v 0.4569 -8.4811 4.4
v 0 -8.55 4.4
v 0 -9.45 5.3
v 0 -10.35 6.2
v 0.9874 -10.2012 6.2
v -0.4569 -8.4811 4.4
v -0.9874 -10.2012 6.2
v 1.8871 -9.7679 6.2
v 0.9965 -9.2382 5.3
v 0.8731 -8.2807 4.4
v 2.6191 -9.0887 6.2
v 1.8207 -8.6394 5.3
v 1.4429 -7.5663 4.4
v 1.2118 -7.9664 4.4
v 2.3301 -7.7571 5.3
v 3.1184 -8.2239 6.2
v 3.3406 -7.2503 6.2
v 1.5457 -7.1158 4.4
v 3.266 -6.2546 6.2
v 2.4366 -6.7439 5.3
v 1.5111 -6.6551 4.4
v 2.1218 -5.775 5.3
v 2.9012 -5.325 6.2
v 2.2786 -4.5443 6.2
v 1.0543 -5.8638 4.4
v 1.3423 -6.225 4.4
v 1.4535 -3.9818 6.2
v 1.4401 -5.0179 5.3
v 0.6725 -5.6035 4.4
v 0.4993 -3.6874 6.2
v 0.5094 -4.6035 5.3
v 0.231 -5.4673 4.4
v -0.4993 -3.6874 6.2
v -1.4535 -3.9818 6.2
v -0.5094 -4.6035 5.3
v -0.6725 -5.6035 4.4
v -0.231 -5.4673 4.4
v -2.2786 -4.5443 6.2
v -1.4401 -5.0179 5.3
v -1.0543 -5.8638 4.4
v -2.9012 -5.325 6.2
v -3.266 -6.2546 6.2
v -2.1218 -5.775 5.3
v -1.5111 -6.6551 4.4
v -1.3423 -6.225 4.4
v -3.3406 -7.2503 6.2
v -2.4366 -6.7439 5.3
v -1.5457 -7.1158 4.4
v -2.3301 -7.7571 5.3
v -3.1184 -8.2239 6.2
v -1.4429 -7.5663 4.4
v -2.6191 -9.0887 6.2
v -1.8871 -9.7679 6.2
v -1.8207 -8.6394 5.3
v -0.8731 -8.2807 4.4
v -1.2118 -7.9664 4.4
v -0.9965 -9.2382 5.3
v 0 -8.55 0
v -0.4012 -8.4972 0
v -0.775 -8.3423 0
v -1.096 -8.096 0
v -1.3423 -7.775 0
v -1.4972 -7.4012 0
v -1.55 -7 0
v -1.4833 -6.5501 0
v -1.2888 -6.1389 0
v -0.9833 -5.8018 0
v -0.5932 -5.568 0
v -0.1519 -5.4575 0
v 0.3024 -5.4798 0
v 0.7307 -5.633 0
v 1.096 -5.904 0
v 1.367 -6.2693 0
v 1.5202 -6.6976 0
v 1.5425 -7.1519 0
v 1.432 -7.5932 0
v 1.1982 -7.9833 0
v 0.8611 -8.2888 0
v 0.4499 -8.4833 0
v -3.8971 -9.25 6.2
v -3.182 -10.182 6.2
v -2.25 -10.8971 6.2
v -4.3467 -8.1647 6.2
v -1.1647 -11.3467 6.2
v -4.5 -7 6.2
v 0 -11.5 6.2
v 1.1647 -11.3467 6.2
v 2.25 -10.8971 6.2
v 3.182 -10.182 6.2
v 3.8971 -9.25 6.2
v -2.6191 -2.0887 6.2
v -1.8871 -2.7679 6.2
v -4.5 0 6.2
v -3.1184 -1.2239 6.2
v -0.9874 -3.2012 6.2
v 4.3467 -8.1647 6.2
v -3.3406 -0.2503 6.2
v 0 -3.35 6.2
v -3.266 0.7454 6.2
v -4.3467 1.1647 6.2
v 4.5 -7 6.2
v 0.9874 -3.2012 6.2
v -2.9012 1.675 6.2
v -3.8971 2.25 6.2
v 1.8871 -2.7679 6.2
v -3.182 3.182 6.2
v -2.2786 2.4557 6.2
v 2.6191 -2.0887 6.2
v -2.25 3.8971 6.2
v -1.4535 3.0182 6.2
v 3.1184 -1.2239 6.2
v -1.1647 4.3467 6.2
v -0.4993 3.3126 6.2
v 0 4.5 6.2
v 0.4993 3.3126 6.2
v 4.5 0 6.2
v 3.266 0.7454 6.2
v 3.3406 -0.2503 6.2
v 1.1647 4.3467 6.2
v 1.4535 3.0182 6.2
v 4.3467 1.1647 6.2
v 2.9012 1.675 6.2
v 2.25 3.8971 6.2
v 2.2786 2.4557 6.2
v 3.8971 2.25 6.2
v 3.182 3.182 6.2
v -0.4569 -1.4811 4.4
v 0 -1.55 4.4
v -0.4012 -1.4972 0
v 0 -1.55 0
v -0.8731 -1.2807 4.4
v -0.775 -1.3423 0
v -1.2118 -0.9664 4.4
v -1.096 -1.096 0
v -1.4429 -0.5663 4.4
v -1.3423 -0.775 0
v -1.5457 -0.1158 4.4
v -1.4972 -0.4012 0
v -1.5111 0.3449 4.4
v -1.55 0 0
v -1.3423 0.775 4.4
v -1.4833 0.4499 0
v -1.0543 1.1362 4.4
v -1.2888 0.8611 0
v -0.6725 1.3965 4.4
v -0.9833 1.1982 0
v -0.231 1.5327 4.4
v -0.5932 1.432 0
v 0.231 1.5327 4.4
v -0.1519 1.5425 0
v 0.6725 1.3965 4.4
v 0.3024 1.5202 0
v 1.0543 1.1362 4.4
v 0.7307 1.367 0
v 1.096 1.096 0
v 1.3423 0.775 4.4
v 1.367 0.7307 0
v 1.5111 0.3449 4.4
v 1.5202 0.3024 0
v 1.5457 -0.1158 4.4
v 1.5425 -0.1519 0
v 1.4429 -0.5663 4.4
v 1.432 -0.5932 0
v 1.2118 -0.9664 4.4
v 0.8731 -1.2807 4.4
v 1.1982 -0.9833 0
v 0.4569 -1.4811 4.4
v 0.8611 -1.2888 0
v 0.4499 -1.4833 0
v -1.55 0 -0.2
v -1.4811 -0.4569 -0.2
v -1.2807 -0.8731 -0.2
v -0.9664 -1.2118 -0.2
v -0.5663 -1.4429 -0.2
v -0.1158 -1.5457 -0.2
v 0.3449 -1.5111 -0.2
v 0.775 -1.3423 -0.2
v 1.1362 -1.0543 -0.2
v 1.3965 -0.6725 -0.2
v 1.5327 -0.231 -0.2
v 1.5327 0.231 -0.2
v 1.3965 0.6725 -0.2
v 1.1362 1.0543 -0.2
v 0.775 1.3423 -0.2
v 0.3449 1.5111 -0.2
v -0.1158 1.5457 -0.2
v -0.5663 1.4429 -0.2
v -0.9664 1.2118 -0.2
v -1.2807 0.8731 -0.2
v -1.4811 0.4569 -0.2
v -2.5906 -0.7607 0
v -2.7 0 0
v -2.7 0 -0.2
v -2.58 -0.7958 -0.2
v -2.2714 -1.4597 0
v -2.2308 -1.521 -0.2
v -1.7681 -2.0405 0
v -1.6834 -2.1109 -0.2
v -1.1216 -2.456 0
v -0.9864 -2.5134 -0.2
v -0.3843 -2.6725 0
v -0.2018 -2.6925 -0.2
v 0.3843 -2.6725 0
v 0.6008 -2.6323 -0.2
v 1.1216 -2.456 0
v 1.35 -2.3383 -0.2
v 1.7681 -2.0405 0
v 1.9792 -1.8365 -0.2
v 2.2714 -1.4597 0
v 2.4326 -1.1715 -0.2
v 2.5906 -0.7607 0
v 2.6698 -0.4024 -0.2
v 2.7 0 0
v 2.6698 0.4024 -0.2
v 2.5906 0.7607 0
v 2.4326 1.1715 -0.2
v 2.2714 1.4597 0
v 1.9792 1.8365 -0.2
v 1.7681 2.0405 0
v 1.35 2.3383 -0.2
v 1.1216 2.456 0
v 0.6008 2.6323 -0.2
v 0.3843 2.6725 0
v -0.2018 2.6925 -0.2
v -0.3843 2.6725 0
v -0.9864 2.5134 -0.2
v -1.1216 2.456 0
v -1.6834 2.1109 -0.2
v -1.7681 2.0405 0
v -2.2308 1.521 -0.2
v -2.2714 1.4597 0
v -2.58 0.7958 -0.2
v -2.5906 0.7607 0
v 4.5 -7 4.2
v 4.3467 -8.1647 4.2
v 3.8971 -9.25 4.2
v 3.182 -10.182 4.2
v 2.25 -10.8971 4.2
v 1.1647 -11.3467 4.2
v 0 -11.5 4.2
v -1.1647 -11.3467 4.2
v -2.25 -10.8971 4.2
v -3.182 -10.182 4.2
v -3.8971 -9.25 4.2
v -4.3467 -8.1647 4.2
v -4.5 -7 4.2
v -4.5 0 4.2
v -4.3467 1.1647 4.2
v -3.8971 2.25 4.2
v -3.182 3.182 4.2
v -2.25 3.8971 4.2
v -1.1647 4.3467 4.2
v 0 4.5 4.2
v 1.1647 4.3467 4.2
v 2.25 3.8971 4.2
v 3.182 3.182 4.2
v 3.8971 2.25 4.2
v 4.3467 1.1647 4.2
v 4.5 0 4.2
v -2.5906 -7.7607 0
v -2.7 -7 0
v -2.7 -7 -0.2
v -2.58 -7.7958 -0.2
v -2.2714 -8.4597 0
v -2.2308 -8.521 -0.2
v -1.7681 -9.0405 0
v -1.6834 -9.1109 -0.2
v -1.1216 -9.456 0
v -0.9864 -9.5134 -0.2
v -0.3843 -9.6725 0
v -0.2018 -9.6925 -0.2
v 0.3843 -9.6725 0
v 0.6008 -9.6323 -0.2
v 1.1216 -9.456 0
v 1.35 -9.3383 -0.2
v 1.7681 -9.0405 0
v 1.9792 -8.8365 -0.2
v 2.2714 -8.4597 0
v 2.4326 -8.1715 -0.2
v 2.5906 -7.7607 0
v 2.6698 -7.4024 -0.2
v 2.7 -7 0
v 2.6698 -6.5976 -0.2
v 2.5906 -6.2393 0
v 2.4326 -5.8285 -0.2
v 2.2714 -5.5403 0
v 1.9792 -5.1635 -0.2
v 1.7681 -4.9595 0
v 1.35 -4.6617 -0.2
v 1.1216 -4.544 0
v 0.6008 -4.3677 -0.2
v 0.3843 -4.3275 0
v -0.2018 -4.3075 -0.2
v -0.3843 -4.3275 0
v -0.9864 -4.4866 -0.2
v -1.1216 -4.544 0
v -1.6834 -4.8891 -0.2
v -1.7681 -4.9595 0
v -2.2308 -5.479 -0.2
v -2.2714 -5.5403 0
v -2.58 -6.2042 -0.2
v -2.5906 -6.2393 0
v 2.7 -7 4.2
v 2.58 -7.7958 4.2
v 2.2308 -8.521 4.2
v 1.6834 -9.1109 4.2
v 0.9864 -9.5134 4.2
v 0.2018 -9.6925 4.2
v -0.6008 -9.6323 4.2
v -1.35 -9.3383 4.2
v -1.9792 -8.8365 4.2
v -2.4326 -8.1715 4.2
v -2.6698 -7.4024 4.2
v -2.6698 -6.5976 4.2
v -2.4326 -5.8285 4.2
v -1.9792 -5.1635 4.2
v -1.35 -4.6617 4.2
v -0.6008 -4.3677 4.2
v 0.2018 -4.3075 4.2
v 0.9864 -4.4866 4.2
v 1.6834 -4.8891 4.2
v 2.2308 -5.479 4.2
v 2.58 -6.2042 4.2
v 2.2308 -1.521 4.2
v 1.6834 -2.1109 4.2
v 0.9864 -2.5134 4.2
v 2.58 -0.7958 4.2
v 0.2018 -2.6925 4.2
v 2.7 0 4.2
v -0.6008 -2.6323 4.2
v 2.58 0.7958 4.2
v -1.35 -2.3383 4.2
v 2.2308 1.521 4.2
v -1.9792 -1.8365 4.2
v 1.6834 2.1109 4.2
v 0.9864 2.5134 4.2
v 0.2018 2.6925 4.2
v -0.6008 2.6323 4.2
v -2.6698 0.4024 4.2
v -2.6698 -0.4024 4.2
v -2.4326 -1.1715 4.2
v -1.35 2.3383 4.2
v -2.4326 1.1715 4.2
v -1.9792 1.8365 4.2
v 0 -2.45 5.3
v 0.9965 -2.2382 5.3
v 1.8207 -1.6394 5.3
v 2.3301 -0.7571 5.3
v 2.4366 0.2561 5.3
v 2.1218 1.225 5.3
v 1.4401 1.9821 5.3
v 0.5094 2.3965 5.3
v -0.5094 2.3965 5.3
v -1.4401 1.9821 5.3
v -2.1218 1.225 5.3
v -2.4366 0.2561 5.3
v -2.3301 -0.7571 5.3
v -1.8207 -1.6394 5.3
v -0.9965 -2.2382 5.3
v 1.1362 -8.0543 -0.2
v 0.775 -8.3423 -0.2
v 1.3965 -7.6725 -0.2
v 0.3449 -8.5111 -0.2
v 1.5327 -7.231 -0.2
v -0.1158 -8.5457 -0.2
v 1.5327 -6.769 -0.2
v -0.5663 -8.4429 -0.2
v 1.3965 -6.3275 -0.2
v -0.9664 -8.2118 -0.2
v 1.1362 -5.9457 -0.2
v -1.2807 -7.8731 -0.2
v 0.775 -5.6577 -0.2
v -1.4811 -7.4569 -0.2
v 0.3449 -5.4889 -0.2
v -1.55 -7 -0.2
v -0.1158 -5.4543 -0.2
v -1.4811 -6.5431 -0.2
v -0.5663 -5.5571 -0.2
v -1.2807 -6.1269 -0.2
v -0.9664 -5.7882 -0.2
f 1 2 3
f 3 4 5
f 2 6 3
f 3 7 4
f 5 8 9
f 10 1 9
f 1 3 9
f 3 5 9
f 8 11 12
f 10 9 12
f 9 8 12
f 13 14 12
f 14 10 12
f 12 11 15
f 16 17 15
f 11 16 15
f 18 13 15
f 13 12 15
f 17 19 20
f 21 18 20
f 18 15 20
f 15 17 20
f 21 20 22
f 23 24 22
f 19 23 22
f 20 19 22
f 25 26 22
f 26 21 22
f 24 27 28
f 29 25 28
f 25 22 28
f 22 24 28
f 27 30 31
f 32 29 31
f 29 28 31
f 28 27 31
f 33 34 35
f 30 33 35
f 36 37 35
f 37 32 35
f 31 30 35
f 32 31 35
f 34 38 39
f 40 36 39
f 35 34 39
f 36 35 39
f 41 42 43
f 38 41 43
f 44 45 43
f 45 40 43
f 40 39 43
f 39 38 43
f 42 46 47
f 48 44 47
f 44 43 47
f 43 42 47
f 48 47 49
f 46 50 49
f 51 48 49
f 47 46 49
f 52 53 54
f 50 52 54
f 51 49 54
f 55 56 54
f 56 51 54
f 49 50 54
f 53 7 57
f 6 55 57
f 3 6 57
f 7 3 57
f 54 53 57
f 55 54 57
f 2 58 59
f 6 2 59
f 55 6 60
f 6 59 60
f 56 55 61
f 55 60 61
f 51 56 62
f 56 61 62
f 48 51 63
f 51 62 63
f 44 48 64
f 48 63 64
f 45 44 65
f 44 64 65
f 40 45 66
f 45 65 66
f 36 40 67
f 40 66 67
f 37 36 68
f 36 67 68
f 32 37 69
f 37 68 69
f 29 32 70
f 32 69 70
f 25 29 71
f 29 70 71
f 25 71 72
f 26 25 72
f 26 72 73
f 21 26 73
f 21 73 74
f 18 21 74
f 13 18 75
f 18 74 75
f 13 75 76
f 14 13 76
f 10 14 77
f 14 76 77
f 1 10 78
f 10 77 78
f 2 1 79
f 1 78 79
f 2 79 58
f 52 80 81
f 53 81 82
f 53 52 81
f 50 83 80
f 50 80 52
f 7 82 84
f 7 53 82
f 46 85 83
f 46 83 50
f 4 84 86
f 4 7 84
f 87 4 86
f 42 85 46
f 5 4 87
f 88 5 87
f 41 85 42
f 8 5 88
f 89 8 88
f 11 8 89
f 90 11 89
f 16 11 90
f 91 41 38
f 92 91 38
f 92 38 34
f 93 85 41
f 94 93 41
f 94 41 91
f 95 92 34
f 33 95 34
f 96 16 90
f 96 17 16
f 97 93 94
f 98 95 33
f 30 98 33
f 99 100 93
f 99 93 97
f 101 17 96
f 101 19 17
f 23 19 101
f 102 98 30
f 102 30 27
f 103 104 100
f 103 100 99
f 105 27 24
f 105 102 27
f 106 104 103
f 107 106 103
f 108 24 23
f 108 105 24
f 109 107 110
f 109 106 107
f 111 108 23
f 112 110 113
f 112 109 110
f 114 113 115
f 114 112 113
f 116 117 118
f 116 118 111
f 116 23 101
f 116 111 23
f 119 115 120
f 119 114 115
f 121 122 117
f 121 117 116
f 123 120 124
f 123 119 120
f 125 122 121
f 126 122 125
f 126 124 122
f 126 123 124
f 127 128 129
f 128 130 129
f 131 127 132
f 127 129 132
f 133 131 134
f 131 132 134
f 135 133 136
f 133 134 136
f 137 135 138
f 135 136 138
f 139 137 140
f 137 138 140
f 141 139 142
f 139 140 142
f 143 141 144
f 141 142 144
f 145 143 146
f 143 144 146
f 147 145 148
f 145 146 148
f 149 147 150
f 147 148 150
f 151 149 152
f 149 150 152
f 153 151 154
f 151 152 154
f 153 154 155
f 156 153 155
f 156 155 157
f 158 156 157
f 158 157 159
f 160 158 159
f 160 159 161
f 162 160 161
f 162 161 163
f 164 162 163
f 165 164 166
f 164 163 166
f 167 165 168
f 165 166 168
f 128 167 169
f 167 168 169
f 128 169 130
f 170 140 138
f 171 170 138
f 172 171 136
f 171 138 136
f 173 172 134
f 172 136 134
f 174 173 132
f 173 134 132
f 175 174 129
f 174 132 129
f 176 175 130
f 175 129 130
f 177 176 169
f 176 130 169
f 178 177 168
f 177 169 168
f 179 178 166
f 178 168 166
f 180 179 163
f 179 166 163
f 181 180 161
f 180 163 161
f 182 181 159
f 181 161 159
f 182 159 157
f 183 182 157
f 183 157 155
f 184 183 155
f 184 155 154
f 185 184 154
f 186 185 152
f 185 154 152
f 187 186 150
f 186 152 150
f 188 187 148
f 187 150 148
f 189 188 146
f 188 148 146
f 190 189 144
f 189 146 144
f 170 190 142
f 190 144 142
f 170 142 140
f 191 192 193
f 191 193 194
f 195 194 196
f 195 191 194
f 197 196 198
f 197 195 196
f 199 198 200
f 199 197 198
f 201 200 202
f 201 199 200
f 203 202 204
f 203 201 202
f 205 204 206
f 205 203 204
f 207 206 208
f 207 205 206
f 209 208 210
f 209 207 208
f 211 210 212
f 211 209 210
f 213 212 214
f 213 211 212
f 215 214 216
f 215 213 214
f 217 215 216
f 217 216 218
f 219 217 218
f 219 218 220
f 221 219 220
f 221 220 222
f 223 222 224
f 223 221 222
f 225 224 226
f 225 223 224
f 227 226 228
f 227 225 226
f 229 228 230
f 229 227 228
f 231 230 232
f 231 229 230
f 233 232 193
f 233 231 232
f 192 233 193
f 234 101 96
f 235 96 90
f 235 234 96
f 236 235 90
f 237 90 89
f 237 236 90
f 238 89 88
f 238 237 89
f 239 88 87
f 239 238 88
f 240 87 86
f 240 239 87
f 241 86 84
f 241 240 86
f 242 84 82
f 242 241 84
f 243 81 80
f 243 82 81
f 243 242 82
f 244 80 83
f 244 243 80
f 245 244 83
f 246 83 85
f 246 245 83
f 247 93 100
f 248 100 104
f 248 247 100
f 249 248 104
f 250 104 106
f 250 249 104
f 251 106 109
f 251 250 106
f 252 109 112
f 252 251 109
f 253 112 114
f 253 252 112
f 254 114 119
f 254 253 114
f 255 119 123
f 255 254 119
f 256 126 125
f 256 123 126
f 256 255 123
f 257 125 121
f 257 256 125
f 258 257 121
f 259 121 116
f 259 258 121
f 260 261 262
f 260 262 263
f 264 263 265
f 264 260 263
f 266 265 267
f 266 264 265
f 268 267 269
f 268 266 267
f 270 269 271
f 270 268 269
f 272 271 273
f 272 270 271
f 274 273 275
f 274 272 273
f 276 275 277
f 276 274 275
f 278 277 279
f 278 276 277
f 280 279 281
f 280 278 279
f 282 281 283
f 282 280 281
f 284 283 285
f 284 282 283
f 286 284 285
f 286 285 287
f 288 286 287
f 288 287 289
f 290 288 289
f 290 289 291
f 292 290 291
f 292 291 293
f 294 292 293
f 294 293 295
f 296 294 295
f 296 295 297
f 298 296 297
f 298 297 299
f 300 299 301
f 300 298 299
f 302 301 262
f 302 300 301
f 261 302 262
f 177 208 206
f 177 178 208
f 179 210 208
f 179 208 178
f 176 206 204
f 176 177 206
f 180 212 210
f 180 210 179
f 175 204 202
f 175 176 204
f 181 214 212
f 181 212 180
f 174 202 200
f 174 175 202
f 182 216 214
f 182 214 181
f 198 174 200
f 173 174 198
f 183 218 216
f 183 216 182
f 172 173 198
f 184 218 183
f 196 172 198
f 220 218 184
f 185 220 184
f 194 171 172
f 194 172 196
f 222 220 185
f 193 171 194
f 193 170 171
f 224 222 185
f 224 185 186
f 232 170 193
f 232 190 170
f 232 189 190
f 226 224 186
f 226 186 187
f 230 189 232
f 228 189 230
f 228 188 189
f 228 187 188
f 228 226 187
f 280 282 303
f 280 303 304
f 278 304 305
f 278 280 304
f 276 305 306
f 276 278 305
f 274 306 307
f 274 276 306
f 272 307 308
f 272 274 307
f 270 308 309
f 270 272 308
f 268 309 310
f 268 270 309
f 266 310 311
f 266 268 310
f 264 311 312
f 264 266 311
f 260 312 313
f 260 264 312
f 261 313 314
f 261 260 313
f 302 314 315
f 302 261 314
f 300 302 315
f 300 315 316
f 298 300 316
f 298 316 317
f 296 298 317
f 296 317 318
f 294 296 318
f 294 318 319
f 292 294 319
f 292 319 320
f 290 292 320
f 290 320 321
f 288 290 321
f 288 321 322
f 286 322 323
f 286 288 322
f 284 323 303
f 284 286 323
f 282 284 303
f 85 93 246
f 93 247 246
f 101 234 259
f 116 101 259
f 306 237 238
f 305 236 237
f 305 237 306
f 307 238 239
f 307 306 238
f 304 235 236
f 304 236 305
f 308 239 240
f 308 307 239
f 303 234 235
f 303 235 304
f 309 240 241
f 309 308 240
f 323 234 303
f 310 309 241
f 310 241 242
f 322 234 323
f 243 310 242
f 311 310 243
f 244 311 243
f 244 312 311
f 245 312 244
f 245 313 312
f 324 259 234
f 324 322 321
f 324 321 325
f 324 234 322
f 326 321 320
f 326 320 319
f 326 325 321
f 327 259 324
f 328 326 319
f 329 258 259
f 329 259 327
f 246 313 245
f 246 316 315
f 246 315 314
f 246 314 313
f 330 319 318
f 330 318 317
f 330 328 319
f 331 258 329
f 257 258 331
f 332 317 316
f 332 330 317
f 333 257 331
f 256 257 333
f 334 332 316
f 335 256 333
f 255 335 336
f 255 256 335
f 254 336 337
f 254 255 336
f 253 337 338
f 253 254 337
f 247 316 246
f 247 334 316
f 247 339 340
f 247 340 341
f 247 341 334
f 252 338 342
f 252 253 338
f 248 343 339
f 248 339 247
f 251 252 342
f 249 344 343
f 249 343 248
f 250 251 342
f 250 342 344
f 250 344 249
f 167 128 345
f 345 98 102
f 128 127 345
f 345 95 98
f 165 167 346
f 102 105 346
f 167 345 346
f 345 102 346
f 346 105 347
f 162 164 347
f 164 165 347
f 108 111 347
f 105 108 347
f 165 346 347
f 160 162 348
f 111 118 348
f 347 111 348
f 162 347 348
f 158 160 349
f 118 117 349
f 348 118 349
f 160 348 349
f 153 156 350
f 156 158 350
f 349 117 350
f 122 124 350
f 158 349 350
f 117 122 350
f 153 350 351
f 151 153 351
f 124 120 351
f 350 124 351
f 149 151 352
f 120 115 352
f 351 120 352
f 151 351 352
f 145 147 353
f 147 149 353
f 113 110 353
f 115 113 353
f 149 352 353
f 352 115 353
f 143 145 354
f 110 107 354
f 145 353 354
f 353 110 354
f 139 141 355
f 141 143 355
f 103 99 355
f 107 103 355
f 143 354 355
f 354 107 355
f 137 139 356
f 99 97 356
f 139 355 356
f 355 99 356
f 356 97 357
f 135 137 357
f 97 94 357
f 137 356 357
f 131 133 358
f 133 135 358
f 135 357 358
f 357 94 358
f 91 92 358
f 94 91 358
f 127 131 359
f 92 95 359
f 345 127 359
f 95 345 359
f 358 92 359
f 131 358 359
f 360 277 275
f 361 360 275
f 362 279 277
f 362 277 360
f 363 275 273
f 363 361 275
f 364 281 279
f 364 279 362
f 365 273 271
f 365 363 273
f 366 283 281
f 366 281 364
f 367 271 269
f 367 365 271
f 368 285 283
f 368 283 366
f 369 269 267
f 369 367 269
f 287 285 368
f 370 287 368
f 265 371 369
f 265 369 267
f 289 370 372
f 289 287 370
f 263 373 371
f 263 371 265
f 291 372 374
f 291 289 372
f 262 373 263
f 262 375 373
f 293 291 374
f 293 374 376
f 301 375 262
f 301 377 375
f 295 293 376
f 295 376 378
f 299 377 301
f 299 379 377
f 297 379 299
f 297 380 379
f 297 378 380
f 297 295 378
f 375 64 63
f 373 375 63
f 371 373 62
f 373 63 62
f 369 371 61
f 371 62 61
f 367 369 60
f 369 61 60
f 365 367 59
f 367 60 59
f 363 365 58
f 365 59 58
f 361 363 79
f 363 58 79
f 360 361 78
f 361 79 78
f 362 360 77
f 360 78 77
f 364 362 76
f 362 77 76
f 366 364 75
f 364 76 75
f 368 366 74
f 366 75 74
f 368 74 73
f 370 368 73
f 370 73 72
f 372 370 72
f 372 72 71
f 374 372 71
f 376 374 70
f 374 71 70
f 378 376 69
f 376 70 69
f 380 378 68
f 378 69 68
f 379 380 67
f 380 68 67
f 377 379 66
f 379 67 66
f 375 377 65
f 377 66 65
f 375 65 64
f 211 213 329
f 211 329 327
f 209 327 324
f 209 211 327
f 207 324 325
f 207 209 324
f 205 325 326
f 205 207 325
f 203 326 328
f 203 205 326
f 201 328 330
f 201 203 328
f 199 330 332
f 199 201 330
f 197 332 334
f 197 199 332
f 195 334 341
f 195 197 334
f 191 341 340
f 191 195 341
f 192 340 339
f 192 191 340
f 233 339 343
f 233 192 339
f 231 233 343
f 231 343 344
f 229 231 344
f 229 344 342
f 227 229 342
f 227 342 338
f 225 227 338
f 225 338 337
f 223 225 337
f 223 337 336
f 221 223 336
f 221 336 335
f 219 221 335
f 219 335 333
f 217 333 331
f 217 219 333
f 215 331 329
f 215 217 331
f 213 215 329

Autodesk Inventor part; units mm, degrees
ref_plane "YZ Plane" through (0, 0, 0) normal (1, 0, 0) x (0, 1, 0)
ref_plane "XZ Plane" through (0, 0, 0) normal (0, 1, 0) x (-1, 0, 0)
ref_plane "XY Plane" through (0, 0, 0) normal (0, 0, 1) x (1, 0, 0)
sketch "Skizze1" plane through (0, 0, 0) normal (0, 0, 1) x (1, 0, 0)
  circle A0 centre (0, 0) radius 2.7
  circle A1 centre (0, -7) radius 2.7
  dimension "d22" = 5.4
  dimension "d23" = 7
extrude "Extrusion1" add sketch "Skizze1" along normal blind 5.2
sketch "Skizze2" plane through (0, 0, 5.2) normal (0, 0, 1) x (1, 0, 0)
  arc A0 (-3, -7) -> (3, -7) centre (0, -7) ccw projected
  arc A1 (-3, -7) -> (3, -7) centre (0, -7) ccw projected
  line L0 (-3, 0) -> (-3, -7)
  arc A2 (3, 0) -> (-3, 0) centre (0, 0) ccw
  line L1 (3, -7) -> (3, 0)
  arc A3 (-3, -7) -> (3, -7) centre (0, -7) ccw
  line L2 (-3, 0) -> (-3, -7) projected
  arc A4 (-3, -7) -> (3, -7) centre (0, -7) ccw projected
  line L3 (3, -7) -> (3, 0) projected
  arc A5 (3, 0) -> (-3, 0) centre (0, 0) ccw projected
  line L4 (-3, 0) -> (-3, -7) projected
  line L5 (-3, 0) -> (-3, -7) projected
  arc A6 (-3, -7) -> (3, -7) centre (0, -7) ccw projected
  arc A7 (-3, -7) -> (3, -7) centre (0, -7) ccw projected
  line L6 (3, -7) -> (3, 0) projected
  line L7 (3, -7) -> (3, 0) projected
  arc A8 (3, 0) -> (-3, 0) centre (0, 0) ccw projected
  arc A9 (3, 0) -> (-3, 0) centre (0, 0) ccw projected
  line L8 (-4.5, 0) -> (-4.5, -7)
  arc A10 (-4.5, -7) -> (4.5, -7) centre (0, -7) ccw
  line L9 (4.5, -7) -> (4.5, 0)
  arc A11 (4.5, 0) -> (-4.5, 0) centre (0, 0) ccw
  dimension "d4" = 9
extrude "Extrusion2" add sketch "Skizze2" along normal blind 2 contours L0 A2 L1 A0 | A11 L9 A10 L8
sketch "Skizze3" plane through (0, 0, 7.2) normal (0, 0, 1) x (1, 0, 0)
  point P0 (0, 0)
  point P1 (0, 0)
  point P2 (0, -7)
  dimension "d7" = 7
hole "Bohrung1" at (0, 0, 7.2) at (0, -7, 7.2) direction (0, 0, -1) diameter 3.1 end through all
chamfer "Fasen1" distance 2.8 angle 45 2 edges at (0, 1.55, 7.2) (0, -5.45, 7.2)
sketch "Skizze5" plane through (0, 0, 5.2) normal (0, 0, -1) x (-1, 0, 0)
  circle A0 centre (0, -7) radius 2.7 projected
  line L0 (4.5, 0) -> (4.5, -7) projected
  arc A1 (-4.5, -7) -> (4.5, -7) centre (0, -7) ccw projected
  line L1 (-4.5, -7) -> (-4.5, 0) projected
  arc A2 (4.5, 0) -> (-4.5, 0) centre (0, 0) ccw projected
  circle A3 centre (0, 0) radius 2.7 projected
  circle A4 centre (0, -7) radius 2.35 projected
  circle A5 centre (0, 0) radius 2.35 projected
extrude "Extrusion4" add sketch "Skizze5" along normal blind 1 contours L0 A1 L1 A2
sketch "Skizze6" plane through (0, 0, 7.2) normal (0, 0, 1) x (1, 0, 0)
  arc A0 (-2.5831, -3.5) -> (2.5831, -3.5) centre (0, -7) ccw projected
  arc A1 (2.5831, -3.5) -> (-2.5831, -3.5) centre (0, 0) ccw projected
  arc A2 (-4.5, -7) -> (4.5, -7) centre (0, -7) ccw projected
  line L0 (-4.5, -7) -> (-4.5, 0) projected
  arc A3 (4.5, 0) -> (-4.5, 0) centre (0, 0) ccw projected
  line L1 (4.5, 0) -> (4.5, -7) projected
extrude "Extrusion5" cut sketch "Skizze6" against normal blind 1 contours A1 A0 | L0 A3 L1 A2
sketch "Skizze7" plane through (0, 0, 0) normal (0, 0, -1) x (-1, 0, 0)
  circle A0 centre (0, 0) radius 1.55 projected
  circle A1 centre (0, 0) radius 2.7 projected
  circle A2 centre (0, -7) radius 1.55 projected
  circle A3 centre (0, -7) radius 2.7 projected
extrude "Extrusion6" add sketch "Skizze7" along normal blind 0.2
properties part number "Stange halter"
